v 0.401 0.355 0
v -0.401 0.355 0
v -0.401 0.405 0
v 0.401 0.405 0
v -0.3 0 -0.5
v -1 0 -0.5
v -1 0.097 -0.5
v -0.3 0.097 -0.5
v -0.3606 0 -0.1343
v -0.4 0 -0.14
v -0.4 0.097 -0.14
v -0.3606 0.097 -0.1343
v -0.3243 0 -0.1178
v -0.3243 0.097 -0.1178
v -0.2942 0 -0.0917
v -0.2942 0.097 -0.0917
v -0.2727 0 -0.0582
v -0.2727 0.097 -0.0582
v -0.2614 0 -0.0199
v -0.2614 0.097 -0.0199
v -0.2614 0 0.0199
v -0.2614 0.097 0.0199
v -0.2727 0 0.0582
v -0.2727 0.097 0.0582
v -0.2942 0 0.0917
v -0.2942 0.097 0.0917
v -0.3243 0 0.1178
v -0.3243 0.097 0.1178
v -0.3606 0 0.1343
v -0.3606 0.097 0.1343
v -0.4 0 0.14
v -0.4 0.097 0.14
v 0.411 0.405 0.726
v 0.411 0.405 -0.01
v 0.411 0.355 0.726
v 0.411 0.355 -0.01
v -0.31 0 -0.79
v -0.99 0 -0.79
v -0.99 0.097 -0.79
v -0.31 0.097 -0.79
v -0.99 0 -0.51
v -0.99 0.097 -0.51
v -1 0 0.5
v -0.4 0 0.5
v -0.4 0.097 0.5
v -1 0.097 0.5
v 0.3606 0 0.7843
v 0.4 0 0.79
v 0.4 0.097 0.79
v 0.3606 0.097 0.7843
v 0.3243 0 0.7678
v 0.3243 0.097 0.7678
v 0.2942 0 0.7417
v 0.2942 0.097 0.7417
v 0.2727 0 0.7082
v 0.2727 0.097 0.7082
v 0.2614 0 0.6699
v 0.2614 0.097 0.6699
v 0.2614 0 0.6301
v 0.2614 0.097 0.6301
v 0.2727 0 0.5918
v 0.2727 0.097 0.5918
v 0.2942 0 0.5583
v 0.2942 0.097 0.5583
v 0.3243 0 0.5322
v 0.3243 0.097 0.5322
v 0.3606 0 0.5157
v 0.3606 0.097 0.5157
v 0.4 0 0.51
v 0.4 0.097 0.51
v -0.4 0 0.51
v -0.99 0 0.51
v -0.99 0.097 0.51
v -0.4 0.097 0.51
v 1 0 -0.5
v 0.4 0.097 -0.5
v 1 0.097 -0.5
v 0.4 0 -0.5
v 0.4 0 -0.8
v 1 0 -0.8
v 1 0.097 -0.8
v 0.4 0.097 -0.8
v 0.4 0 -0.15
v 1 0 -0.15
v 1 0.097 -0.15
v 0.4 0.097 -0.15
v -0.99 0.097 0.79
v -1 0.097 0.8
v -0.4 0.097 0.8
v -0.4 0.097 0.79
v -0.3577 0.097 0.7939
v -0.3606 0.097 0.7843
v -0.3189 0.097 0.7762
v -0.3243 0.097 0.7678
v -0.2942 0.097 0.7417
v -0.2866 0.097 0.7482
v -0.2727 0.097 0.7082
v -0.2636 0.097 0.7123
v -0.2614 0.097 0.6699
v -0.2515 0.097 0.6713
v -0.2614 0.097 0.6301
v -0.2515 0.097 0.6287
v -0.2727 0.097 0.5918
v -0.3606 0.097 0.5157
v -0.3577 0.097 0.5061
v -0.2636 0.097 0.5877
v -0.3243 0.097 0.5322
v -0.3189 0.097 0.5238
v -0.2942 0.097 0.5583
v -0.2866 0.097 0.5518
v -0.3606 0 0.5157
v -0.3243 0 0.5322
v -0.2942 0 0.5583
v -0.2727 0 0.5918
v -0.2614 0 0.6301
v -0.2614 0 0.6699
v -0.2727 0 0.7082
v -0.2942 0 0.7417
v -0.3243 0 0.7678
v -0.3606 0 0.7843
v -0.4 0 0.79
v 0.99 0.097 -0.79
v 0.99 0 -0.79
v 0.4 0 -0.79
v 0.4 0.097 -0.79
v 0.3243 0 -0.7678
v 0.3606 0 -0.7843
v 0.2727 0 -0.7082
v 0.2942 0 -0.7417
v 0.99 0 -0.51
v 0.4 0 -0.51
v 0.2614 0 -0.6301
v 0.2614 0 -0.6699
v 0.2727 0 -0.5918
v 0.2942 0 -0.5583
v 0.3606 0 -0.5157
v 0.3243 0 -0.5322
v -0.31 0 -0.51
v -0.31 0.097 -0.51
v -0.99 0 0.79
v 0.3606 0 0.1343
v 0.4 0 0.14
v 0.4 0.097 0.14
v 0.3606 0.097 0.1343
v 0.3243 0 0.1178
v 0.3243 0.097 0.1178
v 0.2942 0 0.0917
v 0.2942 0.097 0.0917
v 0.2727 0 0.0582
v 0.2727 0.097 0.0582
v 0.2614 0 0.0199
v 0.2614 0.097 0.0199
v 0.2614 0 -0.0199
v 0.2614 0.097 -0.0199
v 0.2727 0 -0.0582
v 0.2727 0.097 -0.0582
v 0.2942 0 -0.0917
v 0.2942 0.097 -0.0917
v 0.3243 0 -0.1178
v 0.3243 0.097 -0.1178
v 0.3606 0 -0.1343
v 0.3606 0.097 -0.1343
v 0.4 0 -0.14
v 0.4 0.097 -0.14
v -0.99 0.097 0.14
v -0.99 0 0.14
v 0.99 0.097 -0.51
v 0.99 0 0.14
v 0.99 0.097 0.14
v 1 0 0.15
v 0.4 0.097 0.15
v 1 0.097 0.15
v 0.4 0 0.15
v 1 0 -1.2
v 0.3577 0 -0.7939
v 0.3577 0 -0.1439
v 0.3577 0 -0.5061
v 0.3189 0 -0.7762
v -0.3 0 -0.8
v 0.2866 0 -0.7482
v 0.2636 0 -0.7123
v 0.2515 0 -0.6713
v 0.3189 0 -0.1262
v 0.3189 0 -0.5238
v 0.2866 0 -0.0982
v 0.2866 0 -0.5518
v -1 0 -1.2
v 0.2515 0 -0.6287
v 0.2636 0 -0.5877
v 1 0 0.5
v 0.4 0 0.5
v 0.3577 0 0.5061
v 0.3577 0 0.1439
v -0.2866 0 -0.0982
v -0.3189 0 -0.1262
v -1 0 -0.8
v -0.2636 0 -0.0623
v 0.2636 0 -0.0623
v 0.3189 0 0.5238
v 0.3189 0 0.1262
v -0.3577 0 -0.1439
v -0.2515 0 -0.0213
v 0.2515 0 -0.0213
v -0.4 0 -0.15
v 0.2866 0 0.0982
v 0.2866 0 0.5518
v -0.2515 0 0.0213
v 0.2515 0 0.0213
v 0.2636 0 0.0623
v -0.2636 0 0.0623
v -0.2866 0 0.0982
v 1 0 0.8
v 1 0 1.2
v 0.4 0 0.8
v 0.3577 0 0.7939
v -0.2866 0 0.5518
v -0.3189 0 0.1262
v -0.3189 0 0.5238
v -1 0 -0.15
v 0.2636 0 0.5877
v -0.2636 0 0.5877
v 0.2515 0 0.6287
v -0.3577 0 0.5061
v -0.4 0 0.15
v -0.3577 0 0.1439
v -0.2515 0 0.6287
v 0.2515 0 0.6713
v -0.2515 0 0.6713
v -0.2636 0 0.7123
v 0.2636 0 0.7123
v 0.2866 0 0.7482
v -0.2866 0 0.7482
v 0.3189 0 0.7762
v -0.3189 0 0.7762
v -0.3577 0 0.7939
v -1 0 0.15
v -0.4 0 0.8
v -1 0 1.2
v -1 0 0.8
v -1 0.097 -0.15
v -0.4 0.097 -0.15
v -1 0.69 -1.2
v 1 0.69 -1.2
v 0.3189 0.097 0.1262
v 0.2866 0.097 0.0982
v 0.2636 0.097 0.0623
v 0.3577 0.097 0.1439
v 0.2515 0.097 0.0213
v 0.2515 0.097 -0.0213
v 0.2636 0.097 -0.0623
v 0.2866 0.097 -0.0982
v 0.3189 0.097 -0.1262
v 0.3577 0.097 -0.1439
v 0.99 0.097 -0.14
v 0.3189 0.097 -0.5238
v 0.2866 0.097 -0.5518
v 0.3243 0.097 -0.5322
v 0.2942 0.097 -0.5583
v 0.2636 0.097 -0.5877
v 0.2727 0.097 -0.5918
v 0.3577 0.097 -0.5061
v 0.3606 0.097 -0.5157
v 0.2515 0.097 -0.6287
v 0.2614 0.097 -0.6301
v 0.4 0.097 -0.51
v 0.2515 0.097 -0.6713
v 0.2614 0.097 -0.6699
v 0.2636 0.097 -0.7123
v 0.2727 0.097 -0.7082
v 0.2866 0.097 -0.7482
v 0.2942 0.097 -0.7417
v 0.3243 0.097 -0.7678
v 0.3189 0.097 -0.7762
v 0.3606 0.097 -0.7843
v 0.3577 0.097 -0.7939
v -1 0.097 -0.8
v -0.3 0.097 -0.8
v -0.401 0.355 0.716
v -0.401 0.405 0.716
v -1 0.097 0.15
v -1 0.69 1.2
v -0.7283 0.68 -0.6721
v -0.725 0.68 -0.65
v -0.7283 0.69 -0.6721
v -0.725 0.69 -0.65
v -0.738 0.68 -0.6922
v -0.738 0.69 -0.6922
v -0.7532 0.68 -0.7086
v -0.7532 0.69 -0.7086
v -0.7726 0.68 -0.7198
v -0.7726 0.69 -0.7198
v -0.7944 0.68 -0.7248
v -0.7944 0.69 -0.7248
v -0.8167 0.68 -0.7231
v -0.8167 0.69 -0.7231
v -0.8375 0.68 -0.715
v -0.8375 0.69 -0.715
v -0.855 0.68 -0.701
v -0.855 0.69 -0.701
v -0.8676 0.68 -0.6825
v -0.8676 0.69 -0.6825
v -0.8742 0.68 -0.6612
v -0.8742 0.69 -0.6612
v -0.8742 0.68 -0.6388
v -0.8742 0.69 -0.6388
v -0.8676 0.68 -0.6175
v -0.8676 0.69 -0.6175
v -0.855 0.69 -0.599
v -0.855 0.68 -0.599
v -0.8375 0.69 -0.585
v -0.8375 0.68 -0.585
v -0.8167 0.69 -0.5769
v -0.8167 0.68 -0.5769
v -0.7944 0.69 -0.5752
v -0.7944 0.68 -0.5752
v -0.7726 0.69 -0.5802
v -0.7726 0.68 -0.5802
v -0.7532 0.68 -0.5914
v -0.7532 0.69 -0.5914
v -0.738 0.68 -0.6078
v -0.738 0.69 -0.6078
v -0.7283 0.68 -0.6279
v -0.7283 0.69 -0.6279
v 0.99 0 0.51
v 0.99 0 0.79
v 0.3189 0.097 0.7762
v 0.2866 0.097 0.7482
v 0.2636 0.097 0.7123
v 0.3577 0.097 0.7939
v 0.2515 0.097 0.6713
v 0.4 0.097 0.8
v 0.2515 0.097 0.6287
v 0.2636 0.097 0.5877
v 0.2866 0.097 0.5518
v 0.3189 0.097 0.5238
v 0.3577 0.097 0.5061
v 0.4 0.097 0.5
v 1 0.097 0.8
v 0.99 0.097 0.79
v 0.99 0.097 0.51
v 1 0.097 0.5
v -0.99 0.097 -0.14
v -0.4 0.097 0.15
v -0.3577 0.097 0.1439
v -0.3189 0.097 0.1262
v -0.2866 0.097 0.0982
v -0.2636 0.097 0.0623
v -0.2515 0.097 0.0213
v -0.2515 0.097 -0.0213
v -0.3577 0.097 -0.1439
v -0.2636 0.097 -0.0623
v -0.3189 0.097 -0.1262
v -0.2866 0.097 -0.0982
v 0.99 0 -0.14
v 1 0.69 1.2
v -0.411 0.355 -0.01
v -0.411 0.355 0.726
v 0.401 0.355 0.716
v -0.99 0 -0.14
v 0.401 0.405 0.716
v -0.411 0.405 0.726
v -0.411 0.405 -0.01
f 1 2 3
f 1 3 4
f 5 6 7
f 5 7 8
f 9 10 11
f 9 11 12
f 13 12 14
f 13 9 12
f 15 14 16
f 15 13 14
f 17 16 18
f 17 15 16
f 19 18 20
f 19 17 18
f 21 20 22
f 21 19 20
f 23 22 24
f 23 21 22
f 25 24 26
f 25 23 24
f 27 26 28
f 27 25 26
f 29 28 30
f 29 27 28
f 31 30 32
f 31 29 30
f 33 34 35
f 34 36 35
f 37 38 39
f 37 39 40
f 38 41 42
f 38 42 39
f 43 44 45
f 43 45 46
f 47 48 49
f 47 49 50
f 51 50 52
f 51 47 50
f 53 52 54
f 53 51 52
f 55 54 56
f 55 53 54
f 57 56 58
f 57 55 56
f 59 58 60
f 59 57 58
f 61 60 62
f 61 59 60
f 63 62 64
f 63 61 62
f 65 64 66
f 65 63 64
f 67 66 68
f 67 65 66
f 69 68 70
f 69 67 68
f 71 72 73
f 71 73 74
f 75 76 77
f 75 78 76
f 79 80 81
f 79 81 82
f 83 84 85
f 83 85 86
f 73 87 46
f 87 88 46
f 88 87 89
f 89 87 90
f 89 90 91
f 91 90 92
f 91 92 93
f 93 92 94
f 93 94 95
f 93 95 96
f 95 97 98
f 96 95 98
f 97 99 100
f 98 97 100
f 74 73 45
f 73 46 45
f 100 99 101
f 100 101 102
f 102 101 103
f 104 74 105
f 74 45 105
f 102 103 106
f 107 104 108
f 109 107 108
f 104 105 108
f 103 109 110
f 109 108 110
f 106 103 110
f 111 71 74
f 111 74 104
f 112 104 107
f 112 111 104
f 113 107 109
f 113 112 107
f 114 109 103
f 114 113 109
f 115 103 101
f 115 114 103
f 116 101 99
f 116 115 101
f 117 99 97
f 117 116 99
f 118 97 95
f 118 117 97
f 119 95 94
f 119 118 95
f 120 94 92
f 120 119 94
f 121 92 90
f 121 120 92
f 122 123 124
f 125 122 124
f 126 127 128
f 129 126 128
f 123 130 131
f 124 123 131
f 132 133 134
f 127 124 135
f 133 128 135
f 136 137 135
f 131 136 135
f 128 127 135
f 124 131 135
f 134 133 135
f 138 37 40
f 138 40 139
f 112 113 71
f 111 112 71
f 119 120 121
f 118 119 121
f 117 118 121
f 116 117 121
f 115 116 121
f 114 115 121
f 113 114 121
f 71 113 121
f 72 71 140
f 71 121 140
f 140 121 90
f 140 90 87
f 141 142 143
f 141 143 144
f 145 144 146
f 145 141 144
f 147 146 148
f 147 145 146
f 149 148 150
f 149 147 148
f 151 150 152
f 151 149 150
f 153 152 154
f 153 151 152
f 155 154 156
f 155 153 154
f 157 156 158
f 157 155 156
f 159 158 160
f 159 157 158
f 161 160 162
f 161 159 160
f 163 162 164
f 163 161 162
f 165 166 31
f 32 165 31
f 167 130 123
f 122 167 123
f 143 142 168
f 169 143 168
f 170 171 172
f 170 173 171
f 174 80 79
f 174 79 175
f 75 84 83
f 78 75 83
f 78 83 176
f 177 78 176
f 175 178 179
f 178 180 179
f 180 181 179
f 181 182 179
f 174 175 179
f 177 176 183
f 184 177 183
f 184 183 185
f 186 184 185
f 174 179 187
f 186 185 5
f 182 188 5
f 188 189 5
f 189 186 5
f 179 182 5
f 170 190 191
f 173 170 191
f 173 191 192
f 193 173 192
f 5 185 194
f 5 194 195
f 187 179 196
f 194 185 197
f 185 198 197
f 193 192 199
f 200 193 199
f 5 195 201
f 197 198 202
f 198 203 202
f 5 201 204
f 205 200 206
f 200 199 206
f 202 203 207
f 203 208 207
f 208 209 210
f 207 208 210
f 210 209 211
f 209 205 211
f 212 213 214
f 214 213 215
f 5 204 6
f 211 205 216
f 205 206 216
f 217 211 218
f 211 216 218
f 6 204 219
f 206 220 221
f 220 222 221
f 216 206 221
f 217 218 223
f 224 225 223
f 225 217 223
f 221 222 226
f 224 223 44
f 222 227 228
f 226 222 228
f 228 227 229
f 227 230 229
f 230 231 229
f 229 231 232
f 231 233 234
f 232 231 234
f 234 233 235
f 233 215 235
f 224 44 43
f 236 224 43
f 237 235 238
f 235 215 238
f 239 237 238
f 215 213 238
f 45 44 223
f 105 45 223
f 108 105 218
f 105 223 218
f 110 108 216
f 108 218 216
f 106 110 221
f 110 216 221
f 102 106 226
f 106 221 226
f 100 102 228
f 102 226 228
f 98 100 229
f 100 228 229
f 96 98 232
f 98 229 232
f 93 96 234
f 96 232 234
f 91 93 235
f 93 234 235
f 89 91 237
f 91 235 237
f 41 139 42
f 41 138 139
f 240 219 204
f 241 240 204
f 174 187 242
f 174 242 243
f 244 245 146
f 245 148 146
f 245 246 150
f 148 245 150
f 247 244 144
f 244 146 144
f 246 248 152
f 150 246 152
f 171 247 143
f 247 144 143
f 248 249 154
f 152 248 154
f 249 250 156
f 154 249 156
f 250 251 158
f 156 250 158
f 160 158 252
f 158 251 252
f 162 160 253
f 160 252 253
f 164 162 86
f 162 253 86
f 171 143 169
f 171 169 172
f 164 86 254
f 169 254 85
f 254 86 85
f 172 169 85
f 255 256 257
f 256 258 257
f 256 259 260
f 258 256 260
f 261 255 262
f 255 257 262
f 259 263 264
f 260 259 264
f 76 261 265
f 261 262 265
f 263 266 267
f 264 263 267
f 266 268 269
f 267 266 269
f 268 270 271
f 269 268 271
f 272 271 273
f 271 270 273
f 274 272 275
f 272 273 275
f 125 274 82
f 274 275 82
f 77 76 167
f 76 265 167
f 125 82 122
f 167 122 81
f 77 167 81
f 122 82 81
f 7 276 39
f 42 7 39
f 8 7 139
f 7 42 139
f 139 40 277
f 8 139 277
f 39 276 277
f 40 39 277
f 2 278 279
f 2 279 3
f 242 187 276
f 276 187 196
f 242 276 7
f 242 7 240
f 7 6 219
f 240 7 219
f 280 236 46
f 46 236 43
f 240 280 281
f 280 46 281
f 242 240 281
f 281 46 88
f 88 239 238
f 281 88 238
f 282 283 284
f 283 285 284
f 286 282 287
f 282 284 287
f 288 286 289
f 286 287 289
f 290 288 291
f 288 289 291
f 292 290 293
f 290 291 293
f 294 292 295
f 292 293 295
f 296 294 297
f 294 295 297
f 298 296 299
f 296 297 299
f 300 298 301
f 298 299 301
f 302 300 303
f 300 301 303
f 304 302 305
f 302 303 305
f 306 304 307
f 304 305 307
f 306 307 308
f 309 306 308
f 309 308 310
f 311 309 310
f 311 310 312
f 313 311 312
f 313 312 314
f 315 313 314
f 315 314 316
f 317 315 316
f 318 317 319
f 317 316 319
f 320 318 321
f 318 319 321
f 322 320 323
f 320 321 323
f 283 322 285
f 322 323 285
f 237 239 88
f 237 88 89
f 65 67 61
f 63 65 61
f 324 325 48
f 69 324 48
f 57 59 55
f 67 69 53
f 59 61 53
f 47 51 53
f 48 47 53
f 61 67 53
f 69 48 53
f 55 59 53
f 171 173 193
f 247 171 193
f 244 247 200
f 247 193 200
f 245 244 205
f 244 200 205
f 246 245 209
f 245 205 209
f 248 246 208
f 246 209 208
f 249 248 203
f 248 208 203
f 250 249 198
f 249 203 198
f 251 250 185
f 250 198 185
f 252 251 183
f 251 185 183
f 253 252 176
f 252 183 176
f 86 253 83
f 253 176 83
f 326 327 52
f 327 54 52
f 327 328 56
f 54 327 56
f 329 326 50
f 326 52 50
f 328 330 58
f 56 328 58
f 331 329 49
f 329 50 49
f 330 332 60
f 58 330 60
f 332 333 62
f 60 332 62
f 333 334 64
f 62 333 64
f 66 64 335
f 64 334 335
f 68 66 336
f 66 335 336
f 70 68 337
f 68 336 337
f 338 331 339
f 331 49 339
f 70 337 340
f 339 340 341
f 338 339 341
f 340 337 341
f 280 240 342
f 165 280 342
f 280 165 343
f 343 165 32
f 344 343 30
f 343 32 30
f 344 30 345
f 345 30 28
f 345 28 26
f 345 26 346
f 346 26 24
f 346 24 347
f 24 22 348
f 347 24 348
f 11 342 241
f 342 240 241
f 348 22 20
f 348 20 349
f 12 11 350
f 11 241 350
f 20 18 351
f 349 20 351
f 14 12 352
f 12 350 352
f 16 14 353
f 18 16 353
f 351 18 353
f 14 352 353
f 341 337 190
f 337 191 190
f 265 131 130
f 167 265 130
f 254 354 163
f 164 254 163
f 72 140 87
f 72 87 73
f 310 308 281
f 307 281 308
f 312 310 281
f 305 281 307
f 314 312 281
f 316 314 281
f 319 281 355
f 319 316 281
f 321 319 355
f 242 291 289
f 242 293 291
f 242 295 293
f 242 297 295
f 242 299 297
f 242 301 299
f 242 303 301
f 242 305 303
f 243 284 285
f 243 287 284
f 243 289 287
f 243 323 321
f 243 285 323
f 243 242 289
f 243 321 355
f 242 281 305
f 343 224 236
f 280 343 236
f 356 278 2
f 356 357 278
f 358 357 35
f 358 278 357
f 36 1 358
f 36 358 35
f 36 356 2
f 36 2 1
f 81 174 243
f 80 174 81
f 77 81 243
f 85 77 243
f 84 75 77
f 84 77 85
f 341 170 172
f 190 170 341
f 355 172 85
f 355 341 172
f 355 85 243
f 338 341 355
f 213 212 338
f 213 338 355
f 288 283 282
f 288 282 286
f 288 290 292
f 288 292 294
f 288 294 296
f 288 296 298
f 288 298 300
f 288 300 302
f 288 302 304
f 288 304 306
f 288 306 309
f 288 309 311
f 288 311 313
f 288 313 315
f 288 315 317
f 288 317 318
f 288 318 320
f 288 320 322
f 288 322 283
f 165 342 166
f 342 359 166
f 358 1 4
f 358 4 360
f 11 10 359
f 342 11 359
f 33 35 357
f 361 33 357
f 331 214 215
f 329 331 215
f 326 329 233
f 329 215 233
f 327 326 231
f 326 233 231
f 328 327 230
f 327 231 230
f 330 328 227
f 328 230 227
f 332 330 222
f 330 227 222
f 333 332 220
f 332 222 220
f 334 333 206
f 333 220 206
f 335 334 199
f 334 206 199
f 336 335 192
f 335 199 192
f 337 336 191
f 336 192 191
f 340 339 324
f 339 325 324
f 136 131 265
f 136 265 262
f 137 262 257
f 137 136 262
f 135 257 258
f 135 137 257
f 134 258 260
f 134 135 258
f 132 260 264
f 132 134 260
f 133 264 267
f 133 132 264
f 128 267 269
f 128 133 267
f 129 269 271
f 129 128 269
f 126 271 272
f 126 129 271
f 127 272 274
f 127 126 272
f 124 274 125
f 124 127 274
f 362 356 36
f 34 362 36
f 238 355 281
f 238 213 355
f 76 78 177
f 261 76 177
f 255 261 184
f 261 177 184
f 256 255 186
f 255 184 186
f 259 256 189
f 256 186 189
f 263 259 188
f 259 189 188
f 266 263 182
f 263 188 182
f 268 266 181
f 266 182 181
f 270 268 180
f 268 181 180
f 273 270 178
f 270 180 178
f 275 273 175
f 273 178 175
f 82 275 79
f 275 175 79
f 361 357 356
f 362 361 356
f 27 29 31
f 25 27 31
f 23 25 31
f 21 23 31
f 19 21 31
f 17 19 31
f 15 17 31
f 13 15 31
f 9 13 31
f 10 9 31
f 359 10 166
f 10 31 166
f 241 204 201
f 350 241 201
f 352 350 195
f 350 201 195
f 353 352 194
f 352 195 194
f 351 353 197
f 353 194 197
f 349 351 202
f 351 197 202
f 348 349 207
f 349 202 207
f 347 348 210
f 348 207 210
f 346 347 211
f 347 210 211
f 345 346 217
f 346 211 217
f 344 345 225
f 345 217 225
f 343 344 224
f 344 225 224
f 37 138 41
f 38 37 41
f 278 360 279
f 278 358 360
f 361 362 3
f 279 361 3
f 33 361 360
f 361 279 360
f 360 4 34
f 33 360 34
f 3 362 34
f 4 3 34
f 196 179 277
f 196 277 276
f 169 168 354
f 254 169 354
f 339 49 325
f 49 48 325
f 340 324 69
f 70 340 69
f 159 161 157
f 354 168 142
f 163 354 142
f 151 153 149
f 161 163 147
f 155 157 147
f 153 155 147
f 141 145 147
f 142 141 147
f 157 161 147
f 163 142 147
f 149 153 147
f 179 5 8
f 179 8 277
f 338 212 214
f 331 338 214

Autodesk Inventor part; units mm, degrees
ref_plane "YZ Plane" through (0, 0, 0) normal (1, 0, 0) x (0, 1, 0)
ref_plane "XZ Plane" through (0, 0, 0) normal (0, 1, 0) x (-1, 0, 0)
ref_plane "XY Plane" through (0, 0, 0) normal (0, 0, 1) x (1, 0, 0)
sketch "Sketch1" plane through (0, 0, 0) normal (0, 1, 0) x (-1, 0, 0)
  line L0 (1, 1.2) -> (-1, 1.2)
  line L1 (-1, 1.2) -> (-1, -1.2)
  line L2 (-1, -1.2) -> (1, -1.2)
  line L3 (1, -1.2) -> (1, 1.2)
  line L4 (1, 1.2) -> (-1, -1.2) construction
  line L5 (-1, 1.2) -> (1, -1.2) construction
  line L6 (1, 0) -> (-1, 0) construction
  line L7 (0, -1.2) -> (0, 1.2) construction
  line L8 (1, -0.15) -> (0.4, -0.15)
  line L9 (0.25, 0) -> (0.25, 0)
  line L10 (0.4, 0.15) -> (1, 0.15)
  line L11 (1, 0.15) -> (1, -0.15)
  arc A0 (0.25, 0) -> (0.4, -0.15) centre (0.4, 0) ccw
  arc A1 (0.4, 0.15) -> (0.25, 0) centre (0.4, 0) ccw
  line L12 (-1, -0.15) -> (-0.4, -0.15)
  line L13 (-0.25, 0) -> (-0.25, 0)
  line L14 (-0.4, 0.15) -> (-1, 0.15)
  line L15 (-1, 0.15) -> (-1, -0.15)
  arc A2 (-0.4, -0.15) -> (-0.25, 0) centre (-0.4, 0) ccw
  arc A3 (-0.25, 0) -> (-0.4, 0.15) centre (-0.4, 0) ccw
  line L16 (1, -0.5) -> (0.3, -0.5)
  line L17 (0.3, -0.5) -> (0.3, -0.8)
  line L18 (0.3, -0.8) -> (1, -0.8)
  line L19 (1, -0.8) -> (1, -0.5)
  line L20 (1, 0.8) -> (0.4, 0.8)
  line L21 (0.25, 0.65) -> (0.25, 0.65)
  line L22 (0.4, 0.5) -> (1, 0.5)
  line L23 (1, 0.5) -> (1, 0.8)
  arc A4 (0.4, 0.8) -> (0.25, 0.65) centre (0.4, 0.65) ccw
  arc A5 (0.25, 0.65) -> (0.4, 0.5) centre (0.4, 0.65) ccw
  line L24 (-1, 0.8) -> (-0.4, 0.8)
  line L25 (-0.25, 0.65) -> (-0.25, 0.65)
  line L26 (-0.4, 0.5) -> (-1, 0.5)
  line L27 (-1, 0.5) -> (-1, 0.8)
  arc A6 (-0.25, 0.65) -> (-0.4, 0.8) centre (-0.4, 0.65) ccw
  arc A7 (-0.4, 0.5) -> (-0.25, 0.65) centre (-0.4, 0.65) ccw
  line L28 (-1, -0.8) -> (-0.4, -0.8)
  line L29 (-0.25, -0.65) -> (-0.25, -0.65)
  line L30 (-0.4, -0.5) -> (-1, -0.5)
  line L31 (-1, -0.5) -> (-1, -0.8)
  arc A8 (-0.25, -0.65) -> (-0.4, -0.5) centre (-0.4, -0.65) ccw
  arc A9 (-0.4, -0.8) -> (-0.25, -0.65) centre (-0.4, -0.65) ccw
  line L32 (0.4, 0.79) -> (0.99, 0.79)
  line L33 (0.99, 0.79) -> (0.99, 0.51)
  line L34 (0.99, 0.51) -> (0.4, 0.51)
  arc A10 (0.26, 0.65) -> (0.4, 0.51) centre (0.4, 0.65) ccw
  arc A11 (0.4, 0.79) -> (0.26, 0.65) centre (0.4, 0.65) ccw
  line L35 (-0.4, 0.79) -> (-0.99, 0.79)
  line L36 (-0.99, 0.79) -> (-0.99, 0.51)
  line L37 (-0.99, 0.51) -> (-0.4, 0.51)
  arc A12 (-0.4, 0.51) -> (-0.26, 0.65) centre (-0.4, 0.65) ccw
  arc A13 (-0.26, 0.65) -> (-0.4, 0.79) centre (-0.4, 0.65) ccw
  line L38 (-0.4, 0.14) -> (-0.99, 0.14)
  line L39 (-0.99, 0.14) -> (-0.99, -0.14)
  line L40 (-0.99, -0.14) -> (-0.4, -0.14)
  arc A14 (-0.4, -0.14) -> (-0.26, 0) centre (-0.4, 0) ccw
  arc A15 (-0.26, 0) -> (-0.4, 0.14) centre (-0.4, 0) ccw
  line L41 (-0.4, -0.51) -> (-0.99, -0.51)
  line L42 (-0.99, -0.51) -> (-0.99, -0.79)
  line L43 (-0.99, -0.79) -> (-0.4, -0.79)
  arc A16 (-0.4, -0.79) -> (-0.26, -0.65) centre (-0.4, -0.65) ccw
  arc A17 (-0.26, -0.65) -> (-0.4, -0.51) centre (-0.4, -0.65) ccw
  line L44 (0.31, -0.79) -> (0.31, -0.51)
  line L45 (0.31, -0.51) -> (0.99, -0.51)
  line L46 (0.99, -0.51) -> (0.99, -0.79)
  line L47 (0.99, -0.79) -> (0.31, -0.79)
  arc A18 (0.26, 0) -> (0.4, -0.14) centre (0.4, 0) ccw
  line L48 (0.4, -0.14) -> (0.99, -0.14)
  line L49 (0.99, -0.14) -> (0.99, 0.14)
  line L50 (0.99, 0.14) -> (0.4, 0.14)
  arc A19 (0.4, 0.14) -> (0.26, 0) centre (0.4, 0) ccw
  point P0 (0, 0)
  point P1 (0.25, 0.15)
  point P2 (0.25, -0.15)
  point P3 (-0.25, 0.15)
  point P4 (-0.25, -0.15)
  point P5 (0.25, 0.5)
  point P6 (0.25, 0.8)
  point P7 (-0.25, 0.5)
  point P8 (-0.25, 0.8)
  point P9 (-0.25, -0.5)
  point P10 (-0.25, -0.8)
  dimension "d0" = 2
  dimension "d1" = 2.4
  dimension "d2" = 0.75
  dimension "d3" = 0.3
  dimension "d4" = 0.15
  dimension "d5" = 0.7
  dimension "d6" = 0.3
  dimension "d7" = 0.65
  dimension "d8" = 0.75
  dimension "d9" = 0.3
  dimension "d10" = 0.65
  dimension "d11" = 0.15
  dimension "d12" = 0.75
  dimension "d13" = 0.3
  dimension "d14" = 0.15
  dimension "d15" = 0.65
  dimension "d16" = 0.01
  dimension "d17" = 0.01
  dimension "d18" = 0.01
  dimension "d19" = 0.01
  dimension "d20" = 0.01
  dimension "d21" = 0.01
extrude "Extrusion1" add sketch "Sketch1" along normal blind 0.097 contours L32 L33 L34 A10 A11 | A13 A12 L37 L36 L35 | A15 A14 L40 L39 L38 | A17 A16 L43 L42 L41 | L44 L45 L46 L47 | A19 L50 L49 L48 A18
extrude "Extrusion2" add sketch "Sketch1" along normal blind 0.097 contours L3 L20 A4 A5 L22 L10 A1 A0 L8 L16 L17 L18 L2 L1 L28 A9 A8 L30 L12 A2 A3 L14 L26 A7 A6 L24 L0
sketch "Sketch2" plane through (0, 0.097, 0) normal (0, 1, 0) x (1, 0, 0)
  line L0 (1, -1.2) -> (1, -0.8) projected
  line L1 (-1, 1.2) -> (1, 1.2)
  line L2 (1, 1.2) -> (1, -1.2)
  line L3 (1, -1.2) -> (-1, -1.2)
  line L4 (-1, -1.2) -> (-1, 1.2)
  point P0 (0, 0)
extrude "Extrusion3" add sketch "Sketch2" along normal blind 0.258
sketch "Sketch3" plane through (0, 0.355, 0) normal (0, 1, 0) x (1, 0, 0)
  line L0 (-0.401, 0) -> (0.401, 0)
  line L1 (0.401, 0) -> (0.401, -0.716)
  line L2 (0.401, -0.716) -> (-0.401, -0.716)
  line L3 (-0.401, -0.716) -> (-0.401, 0)
  line L4 (-1, -0.15) -> (-1, 0.15) construction
  line L5 (-1, 0) -> (0.9997, 0) construction
  line L6 (1, 1.2) -> (-1, 1.2) construction
  line L7 (0, 1.2) -> (0, -1.2) construction
  line L8 (-1, -1.2) -> (1, -1.2) construction
  point P0 (0, 0)
  dimension "d46" = 0.802
  dimension "d47" = 0.716
extrude "Extrusion4" add sketch "Sketch3" along normal blind 0.05
sketch "Sketch4" plane through (0, 0.355, 0) normal (0, 1, 0) x (1, 0, 0)
  line L0 (-1, 1.2) -> (-1, -1.2) projected
  line L1 (-1, -1.2) -> (1, -1.2) projected
  line L2 (-1, 1.2) -> (1, 1.2)
  line L3 (1, 1.2) -> (1, -1.2)
  line L4 (1, -1.2) -> (-1, -1.2)
  line L5 (-1, -1.2) -> (-1, 1.2)
  line L6 (0.401, 0) -> (-0.401, 0) projected
  line L7 (-0.401, 0) -> (-0.401, -0.716) projected
  line L8 (-0.401, -0.716) -> (0.401, -0.716) projected
  line L9 (0.401, -0.716) -> (0.401, 0) projected
  line L10 (-0.411, 0.01) -> (0.411, 0.01)
  line L11 (0.411, 0.01) -> (0.411, -0.726)
  line L12 (0.411, -0.726) -> (-0.411, -0.726)
  line L13 (-0.411, -0.726) -> (-0.411, 0.01)
  point P0 (0, 0)
  dimension "d50" = 0.01
extrude "Extrusion5" add sketch "Sketch4" along normal up to surface (0.05 mm away) contours L2 L3 L1 L0
sketch "Sketch5" plane through (-1, 0.405, -1.2) normal (0, 1, 0) x (1, 0, 0)
  line L0 (0, 0) -> (0, -0.4) projected
  line L1 (2, 0) -> (2, -2.4) projected
  line L2 (0, 0) -> (2, 0)
  line L3 (2, 0) -> (2, -2.4)
  line L4 (2, -2.4) -> (0, -2.4)
  line L5 (0, -2.4) -> (0, 0)
  point P0 (1, -1.2)
extrude "Extrusion6" add sketch "Sketch5" along normal blind 0.285
sketch "Sketch6" plane through (-1, 0.69, -1.2) normal (0, 1, 0) x (1, 0, 0)
  circle A0 centre (0.2, -0.55) radius 0.075
  line L0 (0, 0) -> (0, -2.4) projected
  line L1 (2, 0) -> (0, 0) projected
  point P0 (1, -1.2)
  dimension "d55" = 0.15
  dimension "d56" = 0.2
  dimension "d57" = 0.55
extrude "Extrusion7" cut sketch "Sketch6" against normal blind 0.01
properties part number "tsl2591"
